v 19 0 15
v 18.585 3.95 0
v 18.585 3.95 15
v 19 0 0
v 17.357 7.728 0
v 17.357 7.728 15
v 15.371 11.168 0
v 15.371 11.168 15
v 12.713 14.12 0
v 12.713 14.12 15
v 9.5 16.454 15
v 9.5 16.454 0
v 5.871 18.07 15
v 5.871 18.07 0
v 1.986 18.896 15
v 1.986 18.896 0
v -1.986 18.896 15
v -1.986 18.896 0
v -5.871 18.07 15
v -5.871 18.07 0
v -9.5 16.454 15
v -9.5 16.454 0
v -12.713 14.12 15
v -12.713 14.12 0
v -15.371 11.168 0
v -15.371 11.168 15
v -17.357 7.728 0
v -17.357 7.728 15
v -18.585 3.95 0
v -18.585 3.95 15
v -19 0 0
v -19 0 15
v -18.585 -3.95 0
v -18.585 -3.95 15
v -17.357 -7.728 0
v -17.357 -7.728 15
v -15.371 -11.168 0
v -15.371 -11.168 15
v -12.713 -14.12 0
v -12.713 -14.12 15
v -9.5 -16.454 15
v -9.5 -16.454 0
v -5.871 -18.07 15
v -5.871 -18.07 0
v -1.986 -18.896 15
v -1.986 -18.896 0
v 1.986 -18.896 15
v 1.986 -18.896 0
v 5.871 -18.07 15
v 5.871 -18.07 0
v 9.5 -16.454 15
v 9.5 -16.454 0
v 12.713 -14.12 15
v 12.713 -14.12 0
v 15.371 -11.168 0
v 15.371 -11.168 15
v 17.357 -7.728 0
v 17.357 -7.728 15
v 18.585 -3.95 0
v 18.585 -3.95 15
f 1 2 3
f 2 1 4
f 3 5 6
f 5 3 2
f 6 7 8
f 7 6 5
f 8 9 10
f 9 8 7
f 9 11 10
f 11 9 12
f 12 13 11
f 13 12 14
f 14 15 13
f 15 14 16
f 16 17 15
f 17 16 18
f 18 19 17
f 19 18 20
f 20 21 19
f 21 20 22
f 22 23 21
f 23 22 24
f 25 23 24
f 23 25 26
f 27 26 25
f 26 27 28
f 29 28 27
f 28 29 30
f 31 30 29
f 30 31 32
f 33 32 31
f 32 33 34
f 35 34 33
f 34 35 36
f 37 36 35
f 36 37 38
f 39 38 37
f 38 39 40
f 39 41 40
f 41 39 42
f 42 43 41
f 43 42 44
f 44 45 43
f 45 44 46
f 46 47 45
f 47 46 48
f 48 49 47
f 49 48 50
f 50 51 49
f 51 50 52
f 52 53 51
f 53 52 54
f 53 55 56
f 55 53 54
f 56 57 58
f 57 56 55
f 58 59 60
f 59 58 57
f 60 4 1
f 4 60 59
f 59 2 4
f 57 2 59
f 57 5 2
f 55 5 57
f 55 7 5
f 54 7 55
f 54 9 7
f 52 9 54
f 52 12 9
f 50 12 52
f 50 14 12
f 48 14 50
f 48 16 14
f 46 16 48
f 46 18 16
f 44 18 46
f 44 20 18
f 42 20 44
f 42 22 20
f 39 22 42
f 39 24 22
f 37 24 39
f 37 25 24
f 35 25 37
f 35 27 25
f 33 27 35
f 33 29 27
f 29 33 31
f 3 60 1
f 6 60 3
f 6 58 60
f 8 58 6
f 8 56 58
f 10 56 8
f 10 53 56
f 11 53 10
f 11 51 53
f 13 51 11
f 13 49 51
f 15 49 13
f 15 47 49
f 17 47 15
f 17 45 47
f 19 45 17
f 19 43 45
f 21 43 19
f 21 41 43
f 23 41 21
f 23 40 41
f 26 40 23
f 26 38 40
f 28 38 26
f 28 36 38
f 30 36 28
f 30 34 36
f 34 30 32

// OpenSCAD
// Generated by SolidPython 1.0.1 on 2020-07-29 00:46:44


cylinder(h = 15, r1 = 19, r2 = 19);
/***********************************************
*********      SolidPython code:      **********
************************************************
 
# import packages: SolidPython
from solid import *
from solid.utils import *
from itertools import chain, combinations, permutations


class Resize:

    def __init__(self, scad_file):
        self.scad_file = scad_file
        #self.scad_file = import_scad(scad_file)
        # cone/cylinder param:
        self.r1 = 0
        self.r2 = 0
        self.h = 0
        # rectangular prism param:
        self.w = 0
        self.l = 0
        # ellipse param:
        self.r = 0

    # import OpenScad code (file name corresponds to shape)


    # classify shape + parameters
    def assign(self, param1, param2, param3):
        if self.scad_file == 'cone.scad':
            self.r1 = param1
            self.r2 = param2
            self.h = param3
        elif self.scad_file == 'cylinder.scad':
            self.r1 = param1
            self.r2 = param2
            self.h = param3
        elif self.scad_file == 'rectangularPrism.scad':
            self.h = param1
            self.l = param2
            self.w = param3
        else:
            self.r = param1
            self.h = param2

    # resize parameters
    def iterate(self):
        x = range(3, 20, 2)
        i = 1
        if self.scad_file == 'cone.scad':
            tempList = list(permutations(x, 2))
            for temp in tempList:
                param1 = temp[0]
                param2 = temp[1]
                filepath = 'produced_scad_files/' + 'cone' + str(param1) + '_' + str(param2) + '_' + '.scad'
                scad_render_to_file(cylinder(h=param1, r1=param2, r2=0), filepath)

        elif self.scad_file == 'cylinder.scad':
            tempList = list(permutations(x, 3))
            for temp in tempList:
                param1 = temp[0]
                param2 = temp[1]
                filepath = 'produced_scad_files/' + 'cylinder' + str(param1) + '_' + str(param2) + '_' + '.scad'
                scad_render_to_file(cylinder(h=param1, r1=param2, r2=param2), filepath)

        elif self.scad_file == 'rectangularPrism.scad':
            tempList = list(permutations(x, 3))
            for temp in tempList:
                param1 = temp[0]
                param2 = temp[1]
                param3 = temp[2]
                filepath = 'produced_scad_files/' + 'rectangularPrism' + str(param1) + '_' + str(param2) + '_' + str(
                    param3) + '.scad'
                scad_render_to_file(cube(size=(param1, param2, param3)), filepath)

        elif self.scad_file == 'ellipse.scad':
            tempList = list(permutations(x, 4))
            for temp in tempList:
                param1 = temp[0]
                param2 = temp[1]
                param3 = temp[2]
                param4 = temp[3]
                filepath = 'produced_scad_files/' + 'ellipse' + str(param1) + '_' + str(param2) + '_' + str(param3) + '_' + str(param4) + '.scad'
                scad_render_to_file(scale([param1, param2, param3])(sphere(r=param4)), filepath)

    def render_to_scadfile(self):
        scad_render_to_file(scad, 'example.scad') 
 
************************************************/
